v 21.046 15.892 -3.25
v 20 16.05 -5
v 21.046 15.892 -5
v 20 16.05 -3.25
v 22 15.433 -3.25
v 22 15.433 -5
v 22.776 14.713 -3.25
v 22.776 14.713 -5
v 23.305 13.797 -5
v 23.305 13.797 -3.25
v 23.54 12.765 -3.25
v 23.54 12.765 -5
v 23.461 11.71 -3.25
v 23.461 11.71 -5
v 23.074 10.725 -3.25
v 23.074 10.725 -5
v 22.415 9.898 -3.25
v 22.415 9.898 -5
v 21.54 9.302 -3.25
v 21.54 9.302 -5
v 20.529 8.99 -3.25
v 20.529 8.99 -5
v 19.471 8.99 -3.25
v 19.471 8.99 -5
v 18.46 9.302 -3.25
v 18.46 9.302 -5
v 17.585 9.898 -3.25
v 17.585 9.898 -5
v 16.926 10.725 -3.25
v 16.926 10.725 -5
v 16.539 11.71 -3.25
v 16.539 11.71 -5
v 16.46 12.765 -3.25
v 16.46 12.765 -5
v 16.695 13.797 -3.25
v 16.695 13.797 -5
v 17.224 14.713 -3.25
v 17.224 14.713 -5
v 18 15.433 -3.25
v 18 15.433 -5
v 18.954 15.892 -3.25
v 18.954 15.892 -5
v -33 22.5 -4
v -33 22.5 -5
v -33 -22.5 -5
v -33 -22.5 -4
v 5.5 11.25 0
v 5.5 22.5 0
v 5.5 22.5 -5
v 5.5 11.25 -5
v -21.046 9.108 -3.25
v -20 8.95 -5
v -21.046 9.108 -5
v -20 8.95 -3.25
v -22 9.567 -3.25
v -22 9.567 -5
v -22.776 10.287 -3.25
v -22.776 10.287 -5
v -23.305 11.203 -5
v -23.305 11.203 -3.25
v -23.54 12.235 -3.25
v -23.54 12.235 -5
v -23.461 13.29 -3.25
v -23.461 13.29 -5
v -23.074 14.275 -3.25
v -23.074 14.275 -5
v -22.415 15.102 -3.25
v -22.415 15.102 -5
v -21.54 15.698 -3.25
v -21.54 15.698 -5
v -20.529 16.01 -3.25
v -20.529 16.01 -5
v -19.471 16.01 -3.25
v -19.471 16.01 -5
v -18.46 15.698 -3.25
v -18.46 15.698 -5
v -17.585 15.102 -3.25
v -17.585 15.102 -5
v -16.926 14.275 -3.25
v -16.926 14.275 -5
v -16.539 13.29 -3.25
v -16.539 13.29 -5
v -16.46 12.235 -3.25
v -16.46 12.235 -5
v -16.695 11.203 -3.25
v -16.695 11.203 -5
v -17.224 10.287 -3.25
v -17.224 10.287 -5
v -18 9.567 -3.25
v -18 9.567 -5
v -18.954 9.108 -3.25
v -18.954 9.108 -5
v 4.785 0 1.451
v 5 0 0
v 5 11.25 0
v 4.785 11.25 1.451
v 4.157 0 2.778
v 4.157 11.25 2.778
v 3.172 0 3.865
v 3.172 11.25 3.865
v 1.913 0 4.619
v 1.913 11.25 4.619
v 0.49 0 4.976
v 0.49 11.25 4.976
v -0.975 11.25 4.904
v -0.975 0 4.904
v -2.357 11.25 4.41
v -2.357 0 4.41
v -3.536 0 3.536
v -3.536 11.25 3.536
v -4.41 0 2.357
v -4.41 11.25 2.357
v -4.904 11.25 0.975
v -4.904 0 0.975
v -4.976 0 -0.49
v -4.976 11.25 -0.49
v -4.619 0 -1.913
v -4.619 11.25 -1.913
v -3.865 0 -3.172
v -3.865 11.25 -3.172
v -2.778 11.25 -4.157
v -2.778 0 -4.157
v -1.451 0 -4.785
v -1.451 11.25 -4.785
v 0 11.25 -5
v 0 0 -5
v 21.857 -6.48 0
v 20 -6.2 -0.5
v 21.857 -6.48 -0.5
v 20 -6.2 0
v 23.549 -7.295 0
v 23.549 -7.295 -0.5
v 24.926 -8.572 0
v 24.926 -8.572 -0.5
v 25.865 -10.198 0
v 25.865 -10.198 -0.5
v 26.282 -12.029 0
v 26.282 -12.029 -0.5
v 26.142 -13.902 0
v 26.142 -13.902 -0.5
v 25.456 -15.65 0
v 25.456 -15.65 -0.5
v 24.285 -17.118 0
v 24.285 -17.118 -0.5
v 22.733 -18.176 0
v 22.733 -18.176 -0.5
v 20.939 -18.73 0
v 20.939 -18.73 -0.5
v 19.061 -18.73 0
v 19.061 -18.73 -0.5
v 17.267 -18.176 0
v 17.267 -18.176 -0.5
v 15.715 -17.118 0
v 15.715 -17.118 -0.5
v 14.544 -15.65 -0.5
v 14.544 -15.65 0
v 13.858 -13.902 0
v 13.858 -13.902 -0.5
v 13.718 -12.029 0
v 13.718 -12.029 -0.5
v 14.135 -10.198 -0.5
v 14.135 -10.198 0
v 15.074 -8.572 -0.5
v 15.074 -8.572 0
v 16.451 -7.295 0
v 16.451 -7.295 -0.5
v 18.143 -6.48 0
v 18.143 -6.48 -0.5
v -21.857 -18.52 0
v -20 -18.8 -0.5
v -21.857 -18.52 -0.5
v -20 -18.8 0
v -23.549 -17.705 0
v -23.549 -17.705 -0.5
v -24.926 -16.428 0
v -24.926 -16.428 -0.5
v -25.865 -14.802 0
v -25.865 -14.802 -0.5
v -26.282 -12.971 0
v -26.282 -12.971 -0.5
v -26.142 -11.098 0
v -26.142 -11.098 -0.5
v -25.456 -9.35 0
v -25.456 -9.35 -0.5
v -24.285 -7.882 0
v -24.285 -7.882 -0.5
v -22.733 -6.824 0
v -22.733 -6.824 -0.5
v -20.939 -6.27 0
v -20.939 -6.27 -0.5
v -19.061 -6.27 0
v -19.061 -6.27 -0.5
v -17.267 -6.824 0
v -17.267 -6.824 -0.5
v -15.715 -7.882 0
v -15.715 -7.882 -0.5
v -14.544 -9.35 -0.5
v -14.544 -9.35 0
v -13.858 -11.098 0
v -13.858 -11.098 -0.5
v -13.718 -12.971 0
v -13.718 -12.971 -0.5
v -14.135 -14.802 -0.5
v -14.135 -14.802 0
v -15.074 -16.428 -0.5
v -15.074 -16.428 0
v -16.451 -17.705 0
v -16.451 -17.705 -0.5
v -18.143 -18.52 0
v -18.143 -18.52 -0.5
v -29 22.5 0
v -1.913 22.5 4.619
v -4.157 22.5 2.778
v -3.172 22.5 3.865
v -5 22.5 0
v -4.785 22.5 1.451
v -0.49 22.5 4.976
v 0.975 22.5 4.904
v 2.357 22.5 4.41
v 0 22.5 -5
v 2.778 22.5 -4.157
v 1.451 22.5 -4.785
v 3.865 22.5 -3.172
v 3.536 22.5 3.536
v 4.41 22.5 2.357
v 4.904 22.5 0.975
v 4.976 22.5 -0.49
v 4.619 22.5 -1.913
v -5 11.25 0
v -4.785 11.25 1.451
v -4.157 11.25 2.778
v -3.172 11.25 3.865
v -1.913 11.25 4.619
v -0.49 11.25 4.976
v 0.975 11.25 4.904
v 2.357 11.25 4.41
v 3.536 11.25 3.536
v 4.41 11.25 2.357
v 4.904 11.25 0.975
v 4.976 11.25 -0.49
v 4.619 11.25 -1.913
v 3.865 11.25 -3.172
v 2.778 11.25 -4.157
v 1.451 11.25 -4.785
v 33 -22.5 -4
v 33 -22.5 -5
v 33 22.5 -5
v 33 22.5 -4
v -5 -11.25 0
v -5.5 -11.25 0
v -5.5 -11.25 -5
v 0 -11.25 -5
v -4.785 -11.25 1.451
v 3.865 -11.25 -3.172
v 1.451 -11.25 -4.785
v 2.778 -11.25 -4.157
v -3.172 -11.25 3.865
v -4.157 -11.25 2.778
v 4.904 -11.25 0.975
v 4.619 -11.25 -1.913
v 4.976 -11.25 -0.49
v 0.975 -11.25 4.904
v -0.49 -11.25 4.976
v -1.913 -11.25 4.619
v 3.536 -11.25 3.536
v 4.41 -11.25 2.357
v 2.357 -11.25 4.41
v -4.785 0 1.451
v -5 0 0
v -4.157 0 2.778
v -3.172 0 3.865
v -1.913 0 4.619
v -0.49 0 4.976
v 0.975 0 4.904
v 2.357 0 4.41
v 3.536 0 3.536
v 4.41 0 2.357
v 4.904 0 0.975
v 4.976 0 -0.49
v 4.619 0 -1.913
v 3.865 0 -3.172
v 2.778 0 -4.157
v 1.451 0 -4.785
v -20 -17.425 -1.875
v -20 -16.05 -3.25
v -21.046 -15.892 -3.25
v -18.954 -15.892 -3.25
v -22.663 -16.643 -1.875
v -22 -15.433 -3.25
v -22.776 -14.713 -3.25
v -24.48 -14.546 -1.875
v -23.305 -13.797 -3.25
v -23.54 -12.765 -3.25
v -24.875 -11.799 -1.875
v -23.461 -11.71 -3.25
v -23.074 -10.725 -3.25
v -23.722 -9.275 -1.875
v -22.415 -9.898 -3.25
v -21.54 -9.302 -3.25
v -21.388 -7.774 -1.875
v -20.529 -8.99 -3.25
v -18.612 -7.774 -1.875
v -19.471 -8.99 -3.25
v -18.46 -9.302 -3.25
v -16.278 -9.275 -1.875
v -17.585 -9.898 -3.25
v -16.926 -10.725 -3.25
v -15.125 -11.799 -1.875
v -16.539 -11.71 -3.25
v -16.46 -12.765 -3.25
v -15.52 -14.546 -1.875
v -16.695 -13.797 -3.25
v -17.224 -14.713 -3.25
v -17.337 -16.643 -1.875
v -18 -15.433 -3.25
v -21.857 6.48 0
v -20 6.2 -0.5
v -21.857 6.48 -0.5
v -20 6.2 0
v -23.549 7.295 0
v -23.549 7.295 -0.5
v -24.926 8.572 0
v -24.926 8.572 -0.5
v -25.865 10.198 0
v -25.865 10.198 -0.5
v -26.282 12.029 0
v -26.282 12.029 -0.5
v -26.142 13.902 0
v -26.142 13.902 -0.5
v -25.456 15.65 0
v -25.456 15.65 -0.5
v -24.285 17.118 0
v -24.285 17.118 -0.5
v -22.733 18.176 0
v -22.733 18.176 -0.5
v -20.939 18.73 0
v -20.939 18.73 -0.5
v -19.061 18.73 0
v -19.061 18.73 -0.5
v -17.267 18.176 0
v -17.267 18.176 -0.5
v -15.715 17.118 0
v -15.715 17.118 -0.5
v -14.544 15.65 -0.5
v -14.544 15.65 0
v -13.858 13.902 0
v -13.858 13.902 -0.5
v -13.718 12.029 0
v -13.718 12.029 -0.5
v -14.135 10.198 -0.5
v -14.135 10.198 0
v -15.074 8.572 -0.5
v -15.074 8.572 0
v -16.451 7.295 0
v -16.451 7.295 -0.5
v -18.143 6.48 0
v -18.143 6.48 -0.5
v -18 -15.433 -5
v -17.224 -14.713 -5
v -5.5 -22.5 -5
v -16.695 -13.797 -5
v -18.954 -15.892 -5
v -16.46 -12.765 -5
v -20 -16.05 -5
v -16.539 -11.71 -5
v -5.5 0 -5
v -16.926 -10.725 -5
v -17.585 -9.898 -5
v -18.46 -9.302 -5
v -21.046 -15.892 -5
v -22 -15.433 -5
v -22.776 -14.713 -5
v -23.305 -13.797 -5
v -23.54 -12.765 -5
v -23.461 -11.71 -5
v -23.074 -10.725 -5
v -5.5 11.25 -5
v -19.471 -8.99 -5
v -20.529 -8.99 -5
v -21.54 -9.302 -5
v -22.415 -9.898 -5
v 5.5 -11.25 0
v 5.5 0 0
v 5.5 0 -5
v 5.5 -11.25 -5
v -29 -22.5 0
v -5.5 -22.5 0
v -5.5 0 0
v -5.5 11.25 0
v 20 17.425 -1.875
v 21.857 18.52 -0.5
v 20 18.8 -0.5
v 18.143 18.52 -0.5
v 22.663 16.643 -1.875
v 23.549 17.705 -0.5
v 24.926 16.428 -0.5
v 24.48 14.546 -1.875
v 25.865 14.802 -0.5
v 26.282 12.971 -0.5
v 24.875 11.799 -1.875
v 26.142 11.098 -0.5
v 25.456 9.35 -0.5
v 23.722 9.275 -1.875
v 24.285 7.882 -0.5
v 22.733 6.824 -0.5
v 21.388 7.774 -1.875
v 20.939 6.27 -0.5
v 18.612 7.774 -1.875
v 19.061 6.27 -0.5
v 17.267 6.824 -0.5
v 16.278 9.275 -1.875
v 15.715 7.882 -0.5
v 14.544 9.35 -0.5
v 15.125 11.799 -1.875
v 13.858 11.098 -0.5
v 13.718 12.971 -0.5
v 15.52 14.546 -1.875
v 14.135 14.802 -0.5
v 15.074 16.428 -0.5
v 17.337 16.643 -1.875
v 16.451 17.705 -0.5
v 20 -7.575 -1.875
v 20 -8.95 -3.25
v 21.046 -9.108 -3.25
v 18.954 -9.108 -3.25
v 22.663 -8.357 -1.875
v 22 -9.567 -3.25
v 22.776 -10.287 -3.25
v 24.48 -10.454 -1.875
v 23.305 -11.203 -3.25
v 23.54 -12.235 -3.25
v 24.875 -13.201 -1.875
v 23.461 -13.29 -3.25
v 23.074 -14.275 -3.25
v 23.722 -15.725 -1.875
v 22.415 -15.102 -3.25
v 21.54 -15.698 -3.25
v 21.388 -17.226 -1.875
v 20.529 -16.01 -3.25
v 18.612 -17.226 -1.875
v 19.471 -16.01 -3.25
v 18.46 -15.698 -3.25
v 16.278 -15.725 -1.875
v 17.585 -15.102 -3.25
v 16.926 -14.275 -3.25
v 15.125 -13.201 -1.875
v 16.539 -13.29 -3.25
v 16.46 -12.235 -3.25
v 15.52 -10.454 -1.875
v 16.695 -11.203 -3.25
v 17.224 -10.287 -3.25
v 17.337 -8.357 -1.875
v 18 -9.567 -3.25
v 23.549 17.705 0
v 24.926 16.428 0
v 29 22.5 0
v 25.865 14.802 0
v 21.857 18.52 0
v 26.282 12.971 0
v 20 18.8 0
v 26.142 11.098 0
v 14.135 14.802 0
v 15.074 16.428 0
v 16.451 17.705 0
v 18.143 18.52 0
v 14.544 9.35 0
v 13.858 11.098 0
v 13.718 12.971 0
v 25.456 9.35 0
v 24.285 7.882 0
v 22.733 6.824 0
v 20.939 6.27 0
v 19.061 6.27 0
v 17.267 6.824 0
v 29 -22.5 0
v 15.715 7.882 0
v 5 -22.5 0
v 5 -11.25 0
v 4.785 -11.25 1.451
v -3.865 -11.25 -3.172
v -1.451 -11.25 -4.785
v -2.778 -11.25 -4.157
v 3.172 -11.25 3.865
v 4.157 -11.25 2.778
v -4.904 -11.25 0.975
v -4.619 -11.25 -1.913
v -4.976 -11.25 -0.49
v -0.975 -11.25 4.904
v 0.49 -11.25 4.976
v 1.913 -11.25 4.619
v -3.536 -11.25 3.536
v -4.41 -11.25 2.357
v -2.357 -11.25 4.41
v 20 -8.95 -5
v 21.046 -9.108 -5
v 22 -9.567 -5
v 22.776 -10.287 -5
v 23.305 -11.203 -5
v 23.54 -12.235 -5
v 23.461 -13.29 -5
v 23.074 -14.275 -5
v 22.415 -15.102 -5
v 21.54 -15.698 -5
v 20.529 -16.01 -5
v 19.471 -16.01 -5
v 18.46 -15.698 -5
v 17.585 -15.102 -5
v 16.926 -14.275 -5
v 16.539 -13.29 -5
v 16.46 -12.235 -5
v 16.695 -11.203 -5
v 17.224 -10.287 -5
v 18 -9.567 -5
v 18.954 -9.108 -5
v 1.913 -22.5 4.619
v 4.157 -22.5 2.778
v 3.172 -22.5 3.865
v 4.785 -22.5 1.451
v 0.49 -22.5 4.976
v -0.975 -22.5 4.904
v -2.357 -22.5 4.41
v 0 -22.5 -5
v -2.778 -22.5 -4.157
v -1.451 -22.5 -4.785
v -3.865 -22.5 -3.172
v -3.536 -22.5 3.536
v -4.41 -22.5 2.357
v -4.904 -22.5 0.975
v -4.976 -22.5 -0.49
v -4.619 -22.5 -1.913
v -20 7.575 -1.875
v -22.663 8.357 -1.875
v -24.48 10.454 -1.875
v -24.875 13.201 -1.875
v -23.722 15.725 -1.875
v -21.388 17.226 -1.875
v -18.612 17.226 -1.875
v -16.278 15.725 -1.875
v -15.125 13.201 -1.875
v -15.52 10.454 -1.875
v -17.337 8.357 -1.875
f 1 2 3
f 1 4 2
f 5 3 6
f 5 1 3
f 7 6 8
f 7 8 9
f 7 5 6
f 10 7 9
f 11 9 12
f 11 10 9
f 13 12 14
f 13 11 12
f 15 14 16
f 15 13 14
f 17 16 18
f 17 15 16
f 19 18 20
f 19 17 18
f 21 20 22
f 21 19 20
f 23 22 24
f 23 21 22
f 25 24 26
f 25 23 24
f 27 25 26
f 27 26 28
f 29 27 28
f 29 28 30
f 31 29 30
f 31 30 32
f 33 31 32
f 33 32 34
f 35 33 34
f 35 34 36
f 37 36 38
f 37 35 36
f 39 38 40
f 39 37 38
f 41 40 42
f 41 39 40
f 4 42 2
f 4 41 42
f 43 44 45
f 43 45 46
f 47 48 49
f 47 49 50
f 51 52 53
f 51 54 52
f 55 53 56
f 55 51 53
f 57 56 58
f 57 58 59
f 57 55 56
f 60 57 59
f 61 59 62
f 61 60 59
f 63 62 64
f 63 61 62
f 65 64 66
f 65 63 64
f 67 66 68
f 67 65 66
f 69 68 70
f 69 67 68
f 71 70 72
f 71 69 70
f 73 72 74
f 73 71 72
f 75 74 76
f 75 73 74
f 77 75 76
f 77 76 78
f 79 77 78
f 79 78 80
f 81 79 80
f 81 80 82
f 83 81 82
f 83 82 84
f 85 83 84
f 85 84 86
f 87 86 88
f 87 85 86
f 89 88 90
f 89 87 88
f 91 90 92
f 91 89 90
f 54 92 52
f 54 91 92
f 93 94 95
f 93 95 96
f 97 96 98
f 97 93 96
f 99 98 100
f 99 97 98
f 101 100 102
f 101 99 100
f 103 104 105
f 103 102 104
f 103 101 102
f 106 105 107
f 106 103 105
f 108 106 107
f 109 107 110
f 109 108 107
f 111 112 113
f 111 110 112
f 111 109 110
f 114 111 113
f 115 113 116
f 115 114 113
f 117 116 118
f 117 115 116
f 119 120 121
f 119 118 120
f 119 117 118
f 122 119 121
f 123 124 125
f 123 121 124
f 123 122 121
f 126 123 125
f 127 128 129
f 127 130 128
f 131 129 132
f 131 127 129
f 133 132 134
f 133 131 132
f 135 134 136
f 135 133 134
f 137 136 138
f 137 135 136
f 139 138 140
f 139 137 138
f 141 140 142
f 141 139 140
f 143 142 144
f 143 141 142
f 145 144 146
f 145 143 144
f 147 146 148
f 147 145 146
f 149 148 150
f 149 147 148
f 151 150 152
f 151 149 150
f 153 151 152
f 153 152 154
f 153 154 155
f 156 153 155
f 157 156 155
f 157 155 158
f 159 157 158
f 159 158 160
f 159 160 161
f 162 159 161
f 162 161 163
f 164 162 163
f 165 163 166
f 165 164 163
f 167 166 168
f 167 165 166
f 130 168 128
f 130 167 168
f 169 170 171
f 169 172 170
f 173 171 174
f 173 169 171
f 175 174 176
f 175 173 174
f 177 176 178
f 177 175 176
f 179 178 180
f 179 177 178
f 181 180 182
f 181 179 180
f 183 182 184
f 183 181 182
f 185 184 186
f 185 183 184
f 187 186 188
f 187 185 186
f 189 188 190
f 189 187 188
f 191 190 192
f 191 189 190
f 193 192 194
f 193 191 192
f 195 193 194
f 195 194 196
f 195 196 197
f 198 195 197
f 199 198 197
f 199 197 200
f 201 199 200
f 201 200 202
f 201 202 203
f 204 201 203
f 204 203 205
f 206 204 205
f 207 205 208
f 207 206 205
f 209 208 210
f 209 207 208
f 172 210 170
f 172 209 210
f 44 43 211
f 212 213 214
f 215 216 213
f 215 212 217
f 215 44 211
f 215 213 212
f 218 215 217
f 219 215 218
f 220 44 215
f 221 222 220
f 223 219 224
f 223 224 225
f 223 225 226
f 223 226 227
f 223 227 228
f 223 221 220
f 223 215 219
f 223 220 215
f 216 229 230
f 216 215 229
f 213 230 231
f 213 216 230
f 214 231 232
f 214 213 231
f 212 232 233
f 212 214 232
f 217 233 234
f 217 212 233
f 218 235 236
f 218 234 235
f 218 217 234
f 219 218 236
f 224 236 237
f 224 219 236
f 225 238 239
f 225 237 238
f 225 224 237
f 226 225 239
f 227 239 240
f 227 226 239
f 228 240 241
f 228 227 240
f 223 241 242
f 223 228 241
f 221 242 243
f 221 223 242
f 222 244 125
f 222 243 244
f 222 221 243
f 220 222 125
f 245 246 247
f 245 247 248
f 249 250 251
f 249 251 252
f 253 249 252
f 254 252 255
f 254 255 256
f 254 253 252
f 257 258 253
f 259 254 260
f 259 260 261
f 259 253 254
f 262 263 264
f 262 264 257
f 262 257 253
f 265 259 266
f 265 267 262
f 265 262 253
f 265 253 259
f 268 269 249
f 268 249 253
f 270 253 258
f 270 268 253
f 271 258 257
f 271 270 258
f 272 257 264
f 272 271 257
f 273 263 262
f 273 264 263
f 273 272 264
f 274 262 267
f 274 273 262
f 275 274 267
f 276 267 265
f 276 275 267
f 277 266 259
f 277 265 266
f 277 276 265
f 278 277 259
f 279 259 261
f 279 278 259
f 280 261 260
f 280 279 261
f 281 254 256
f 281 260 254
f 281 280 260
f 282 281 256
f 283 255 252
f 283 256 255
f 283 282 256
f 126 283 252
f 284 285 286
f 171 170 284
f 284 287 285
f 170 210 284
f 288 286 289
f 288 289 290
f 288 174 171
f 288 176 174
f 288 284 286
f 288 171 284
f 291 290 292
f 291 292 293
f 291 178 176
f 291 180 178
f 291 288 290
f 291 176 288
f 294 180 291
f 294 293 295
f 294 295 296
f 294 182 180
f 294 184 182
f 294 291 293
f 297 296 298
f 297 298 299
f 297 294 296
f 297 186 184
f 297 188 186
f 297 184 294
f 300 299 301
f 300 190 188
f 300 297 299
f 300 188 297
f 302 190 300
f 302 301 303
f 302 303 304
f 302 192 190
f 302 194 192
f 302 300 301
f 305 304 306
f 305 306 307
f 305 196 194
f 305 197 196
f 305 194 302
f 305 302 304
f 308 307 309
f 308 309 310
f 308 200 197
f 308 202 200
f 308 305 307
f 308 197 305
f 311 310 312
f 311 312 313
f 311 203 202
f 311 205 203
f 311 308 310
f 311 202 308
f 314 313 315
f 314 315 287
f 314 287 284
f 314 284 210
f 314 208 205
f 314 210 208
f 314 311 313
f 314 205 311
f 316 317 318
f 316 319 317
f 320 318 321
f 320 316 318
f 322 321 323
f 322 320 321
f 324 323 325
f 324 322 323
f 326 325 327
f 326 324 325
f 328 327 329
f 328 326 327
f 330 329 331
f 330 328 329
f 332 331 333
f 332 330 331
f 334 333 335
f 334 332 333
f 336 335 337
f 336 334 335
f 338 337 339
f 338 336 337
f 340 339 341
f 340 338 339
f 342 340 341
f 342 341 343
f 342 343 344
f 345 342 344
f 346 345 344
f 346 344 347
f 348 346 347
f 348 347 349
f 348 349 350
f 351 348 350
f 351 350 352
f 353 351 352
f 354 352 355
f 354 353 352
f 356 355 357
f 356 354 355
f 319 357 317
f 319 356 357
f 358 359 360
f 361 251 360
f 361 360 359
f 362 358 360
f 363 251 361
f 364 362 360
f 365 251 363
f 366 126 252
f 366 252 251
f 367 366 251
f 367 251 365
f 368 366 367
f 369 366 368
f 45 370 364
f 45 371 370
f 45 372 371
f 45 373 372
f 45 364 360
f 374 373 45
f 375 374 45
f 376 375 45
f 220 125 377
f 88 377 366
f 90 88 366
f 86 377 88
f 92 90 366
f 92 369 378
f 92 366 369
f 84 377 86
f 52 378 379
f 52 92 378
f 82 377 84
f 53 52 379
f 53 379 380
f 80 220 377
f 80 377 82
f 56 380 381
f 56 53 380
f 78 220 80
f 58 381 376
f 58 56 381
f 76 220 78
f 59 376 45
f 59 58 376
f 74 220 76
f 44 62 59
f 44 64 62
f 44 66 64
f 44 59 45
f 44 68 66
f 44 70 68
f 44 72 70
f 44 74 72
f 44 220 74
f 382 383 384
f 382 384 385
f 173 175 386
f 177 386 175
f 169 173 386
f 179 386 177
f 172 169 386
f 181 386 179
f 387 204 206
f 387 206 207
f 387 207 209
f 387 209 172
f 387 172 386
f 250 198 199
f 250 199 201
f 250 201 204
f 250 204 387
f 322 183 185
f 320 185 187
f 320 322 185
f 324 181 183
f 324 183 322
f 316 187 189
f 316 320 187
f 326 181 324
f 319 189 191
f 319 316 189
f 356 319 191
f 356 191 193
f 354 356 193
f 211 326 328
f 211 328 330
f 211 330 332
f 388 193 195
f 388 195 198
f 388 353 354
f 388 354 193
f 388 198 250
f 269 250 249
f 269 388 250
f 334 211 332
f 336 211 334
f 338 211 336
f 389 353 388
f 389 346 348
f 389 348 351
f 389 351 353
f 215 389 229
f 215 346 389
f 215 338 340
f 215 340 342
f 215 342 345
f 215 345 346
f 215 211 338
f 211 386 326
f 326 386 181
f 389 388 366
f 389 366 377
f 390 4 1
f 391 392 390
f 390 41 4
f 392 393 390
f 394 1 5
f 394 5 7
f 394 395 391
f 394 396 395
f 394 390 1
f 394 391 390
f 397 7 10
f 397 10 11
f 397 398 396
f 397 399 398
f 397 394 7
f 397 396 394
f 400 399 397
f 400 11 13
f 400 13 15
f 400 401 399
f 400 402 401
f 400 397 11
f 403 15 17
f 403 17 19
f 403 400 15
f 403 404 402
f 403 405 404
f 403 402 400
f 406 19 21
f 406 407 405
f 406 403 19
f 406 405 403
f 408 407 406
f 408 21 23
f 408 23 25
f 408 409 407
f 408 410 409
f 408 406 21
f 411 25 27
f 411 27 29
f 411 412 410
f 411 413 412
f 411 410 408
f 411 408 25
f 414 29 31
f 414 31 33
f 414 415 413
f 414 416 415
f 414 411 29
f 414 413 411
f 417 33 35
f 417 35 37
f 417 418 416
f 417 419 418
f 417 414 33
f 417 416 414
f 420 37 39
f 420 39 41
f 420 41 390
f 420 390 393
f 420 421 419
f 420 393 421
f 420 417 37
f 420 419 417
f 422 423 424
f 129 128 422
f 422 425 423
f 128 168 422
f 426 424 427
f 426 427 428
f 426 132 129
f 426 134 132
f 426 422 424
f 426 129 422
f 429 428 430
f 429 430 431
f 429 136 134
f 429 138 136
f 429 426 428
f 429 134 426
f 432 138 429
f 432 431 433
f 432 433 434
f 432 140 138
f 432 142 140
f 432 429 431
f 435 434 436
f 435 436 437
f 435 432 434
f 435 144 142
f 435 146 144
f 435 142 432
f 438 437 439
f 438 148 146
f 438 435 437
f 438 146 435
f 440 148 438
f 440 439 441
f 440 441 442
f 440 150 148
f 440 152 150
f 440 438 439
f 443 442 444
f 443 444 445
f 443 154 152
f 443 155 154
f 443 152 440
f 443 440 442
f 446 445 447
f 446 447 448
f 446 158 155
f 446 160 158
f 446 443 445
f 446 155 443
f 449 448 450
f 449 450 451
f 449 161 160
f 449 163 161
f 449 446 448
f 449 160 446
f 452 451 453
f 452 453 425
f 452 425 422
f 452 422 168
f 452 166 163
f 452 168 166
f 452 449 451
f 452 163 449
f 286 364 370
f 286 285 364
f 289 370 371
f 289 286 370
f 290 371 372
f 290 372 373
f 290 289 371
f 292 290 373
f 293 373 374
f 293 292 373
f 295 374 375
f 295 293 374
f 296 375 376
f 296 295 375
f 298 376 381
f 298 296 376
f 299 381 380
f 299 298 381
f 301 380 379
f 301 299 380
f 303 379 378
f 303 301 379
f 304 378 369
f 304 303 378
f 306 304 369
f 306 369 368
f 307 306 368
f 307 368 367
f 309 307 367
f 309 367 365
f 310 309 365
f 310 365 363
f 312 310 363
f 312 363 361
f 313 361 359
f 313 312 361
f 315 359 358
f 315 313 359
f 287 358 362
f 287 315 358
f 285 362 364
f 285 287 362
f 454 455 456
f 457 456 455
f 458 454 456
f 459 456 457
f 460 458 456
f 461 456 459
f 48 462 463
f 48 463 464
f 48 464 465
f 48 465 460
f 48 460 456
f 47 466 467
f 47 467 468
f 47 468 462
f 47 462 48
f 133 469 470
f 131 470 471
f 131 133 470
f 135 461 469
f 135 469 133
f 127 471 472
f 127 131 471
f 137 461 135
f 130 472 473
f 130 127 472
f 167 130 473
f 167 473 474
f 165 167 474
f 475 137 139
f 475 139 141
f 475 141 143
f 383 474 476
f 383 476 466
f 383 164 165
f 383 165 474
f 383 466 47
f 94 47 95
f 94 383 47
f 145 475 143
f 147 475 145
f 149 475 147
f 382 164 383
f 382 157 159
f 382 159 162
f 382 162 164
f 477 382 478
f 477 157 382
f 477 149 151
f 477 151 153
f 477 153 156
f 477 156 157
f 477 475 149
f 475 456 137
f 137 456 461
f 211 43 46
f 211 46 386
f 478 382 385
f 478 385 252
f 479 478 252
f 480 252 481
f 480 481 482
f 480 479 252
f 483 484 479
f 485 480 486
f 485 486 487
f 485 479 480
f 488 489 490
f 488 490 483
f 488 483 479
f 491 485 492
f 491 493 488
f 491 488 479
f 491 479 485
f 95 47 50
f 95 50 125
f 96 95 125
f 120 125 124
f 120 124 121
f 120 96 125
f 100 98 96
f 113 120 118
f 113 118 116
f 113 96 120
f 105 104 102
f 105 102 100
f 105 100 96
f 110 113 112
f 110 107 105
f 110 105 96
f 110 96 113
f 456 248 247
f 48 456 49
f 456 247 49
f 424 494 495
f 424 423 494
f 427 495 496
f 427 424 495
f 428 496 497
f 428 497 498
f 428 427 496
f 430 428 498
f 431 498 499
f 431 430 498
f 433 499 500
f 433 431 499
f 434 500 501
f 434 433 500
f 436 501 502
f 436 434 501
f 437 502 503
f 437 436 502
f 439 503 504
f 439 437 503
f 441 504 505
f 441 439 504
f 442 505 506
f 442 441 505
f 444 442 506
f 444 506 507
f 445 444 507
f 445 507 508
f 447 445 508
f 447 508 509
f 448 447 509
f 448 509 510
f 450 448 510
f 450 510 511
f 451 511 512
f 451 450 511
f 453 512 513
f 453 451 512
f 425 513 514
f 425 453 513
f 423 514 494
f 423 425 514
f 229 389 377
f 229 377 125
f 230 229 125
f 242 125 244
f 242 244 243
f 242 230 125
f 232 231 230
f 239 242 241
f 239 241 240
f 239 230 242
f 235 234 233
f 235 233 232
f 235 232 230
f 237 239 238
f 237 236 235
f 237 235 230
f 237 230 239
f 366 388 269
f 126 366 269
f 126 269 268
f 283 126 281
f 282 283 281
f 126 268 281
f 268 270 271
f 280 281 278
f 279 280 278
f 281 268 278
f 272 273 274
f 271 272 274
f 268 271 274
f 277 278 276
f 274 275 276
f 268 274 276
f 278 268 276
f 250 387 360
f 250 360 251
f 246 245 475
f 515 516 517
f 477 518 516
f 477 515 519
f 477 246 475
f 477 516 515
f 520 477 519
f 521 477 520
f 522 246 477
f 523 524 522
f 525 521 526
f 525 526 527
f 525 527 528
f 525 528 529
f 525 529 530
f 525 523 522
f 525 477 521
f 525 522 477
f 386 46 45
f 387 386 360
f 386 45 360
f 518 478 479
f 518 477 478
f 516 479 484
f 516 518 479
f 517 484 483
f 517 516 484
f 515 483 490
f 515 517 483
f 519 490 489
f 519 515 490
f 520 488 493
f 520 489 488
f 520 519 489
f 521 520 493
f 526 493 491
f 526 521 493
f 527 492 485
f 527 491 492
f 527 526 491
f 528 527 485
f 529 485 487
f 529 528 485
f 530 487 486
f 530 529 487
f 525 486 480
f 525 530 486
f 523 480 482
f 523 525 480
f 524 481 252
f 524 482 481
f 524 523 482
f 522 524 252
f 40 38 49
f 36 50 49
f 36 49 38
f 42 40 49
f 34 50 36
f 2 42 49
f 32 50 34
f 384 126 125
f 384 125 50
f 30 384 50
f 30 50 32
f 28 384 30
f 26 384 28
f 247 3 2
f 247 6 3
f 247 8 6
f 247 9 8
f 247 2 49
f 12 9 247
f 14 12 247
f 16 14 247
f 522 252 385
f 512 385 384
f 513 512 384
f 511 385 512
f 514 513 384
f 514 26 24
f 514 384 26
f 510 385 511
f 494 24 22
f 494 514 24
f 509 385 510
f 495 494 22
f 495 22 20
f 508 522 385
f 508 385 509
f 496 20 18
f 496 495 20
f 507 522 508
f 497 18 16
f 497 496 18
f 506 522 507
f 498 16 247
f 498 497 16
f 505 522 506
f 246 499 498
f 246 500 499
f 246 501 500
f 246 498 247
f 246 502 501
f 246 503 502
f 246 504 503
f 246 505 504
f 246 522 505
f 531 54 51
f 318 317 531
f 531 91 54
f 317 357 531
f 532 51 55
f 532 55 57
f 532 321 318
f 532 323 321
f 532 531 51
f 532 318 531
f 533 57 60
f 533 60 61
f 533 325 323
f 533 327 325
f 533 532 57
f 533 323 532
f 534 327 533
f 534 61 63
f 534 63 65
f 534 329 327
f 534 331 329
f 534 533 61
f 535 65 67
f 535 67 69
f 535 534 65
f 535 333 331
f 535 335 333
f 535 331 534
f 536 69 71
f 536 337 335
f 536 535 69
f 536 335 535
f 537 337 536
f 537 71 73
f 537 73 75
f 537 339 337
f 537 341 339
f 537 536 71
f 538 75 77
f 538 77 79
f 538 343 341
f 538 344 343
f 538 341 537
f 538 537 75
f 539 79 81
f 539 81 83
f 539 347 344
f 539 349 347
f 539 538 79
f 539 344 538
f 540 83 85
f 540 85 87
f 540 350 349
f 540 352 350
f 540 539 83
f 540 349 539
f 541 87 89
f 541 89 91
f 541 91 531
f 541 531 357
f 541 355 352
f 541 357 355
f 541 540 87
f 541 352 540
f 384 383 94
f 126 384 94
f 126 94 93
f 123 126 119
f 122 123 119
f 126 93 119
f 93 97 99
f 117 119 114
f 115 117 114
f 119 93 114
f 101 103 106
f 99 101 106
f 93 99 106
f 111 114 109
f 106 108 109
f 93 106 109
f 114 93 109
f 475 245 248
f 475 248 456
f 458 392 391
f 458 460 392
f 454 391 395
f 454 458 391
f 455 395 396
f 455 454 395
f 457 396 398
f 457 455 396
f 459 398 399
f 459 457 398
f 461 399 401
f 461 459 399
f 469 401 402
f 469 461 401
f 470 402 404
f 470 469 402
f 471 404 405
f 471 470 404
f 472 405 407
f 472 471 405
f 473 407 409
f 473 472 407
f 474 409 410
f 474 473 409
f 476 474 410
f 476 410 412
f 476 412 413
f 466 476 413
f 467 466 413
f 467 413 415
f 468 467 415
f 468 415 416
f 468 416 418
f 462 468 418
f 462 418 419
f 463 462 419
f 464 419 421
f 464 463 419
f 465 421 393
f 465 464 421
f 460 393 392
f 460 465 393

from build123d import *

# Parameters (mm, degrees)
EXTRUDE_1_DEPTH            = 22.5
SKETCH_3_W                 = 10.5
SKETCH_3_H                 = 11.25
CUT_EXTRUDE_1_DEPTH        = 6
CUT_EXTRUDE_1_DEPTH_BACK   = 6
HOLE_WIZARD_M61_AT_2_COUNT = 2
HOLE_WIZARD_M61_AT_2_PITCH = 25
PATTERN_CIRCULAR_1_COUNT   = 2


with BuildPart() as part:
    # Эскиз1 → Бобышка-Вытянуть1 (new body, symmetric)
    with BuildSketch(Plane(origin=(0, 0, 0), x_dir=(1, 0, 0), z_dir=(0, 1, 0))):
        with BuildLine():
            Line((0, 5), (-33, 5))
            Line((-33, 5), (-33, 4))
            Line((-33, 4), (-29, 0))
            Line((-29, 0), (-5, 0))
            ThreePointArc((-5, 0), (3.535533906, -3.535533906), (0, 5))
        make_face()
    extrude(amount=EXTRUDE_1_DEPTH, both=True)

    # Эскиз3 → Вырез-Вытянуть1 (cut, two sides)
    with BuildSketch(Plane.XY) as cut_extrude_1_sk:
        with Locations((-0.25, 5.625)):
            Rectangle(SKETCH_3_W, SKETCH_3_H)
        with Locations((-0.25, -16.875)):
            Rectangle(SKETCH_3_W, SKETCH_3_H)
    extrude(amount=CUT_EXTRUDE_1_DEPTH, mode=Mode.SUBTRACT)
    extrude(cut_extrude_1_sk.sketch, amount=-CUT_EXTRUDE_1_DEPTH_BACK, mode=Mode.SUBTRACT)

    # Эскиз6 → Зенковка для винта с полупотайной головкой M61 (revolve, cut)
    with BuildSketch(Plane(origin=(-20, 12.5, 0), x_dir=(0, -1, 0), z_dir=(1, 0, 0))):
        Polygon((0, 0), (0, 5), (3.55, 5), (3.55, 3.25), (6.3, 0.5), (6.3, 0), align=None)
    hole_wizard_m61 = revolve(axis=Axis((-20, 12.5, 6.35), (0, 0, -1)), mode=Mode.SUBTRACT)

    # Зенковка для винта с полупотайной головкой M61 at 2: Зенковка для винта с полупотайной головкой M61 ×2
    with Locations(*[(0, -i * HOLE_WIZARD_M61_AT_2_PITCH, 0) for i in range(1, HOLE_WIZARD_M61_AT_2_COUNT)]):
        add(hole_wizard_m61, mode=Mode.SUBTRACT)


with BuildPart() as pattern_circular_1_1:
    # Круговой массив1: pattern copy
    add(part.part.rotate(Axis((0, 0, 0), (0, 0, 1)), 1 * 360 / PATTERN_CIRCULAR_1_COUNT))


solid = Compound([part.part, pattern_circular_1_1.part])
